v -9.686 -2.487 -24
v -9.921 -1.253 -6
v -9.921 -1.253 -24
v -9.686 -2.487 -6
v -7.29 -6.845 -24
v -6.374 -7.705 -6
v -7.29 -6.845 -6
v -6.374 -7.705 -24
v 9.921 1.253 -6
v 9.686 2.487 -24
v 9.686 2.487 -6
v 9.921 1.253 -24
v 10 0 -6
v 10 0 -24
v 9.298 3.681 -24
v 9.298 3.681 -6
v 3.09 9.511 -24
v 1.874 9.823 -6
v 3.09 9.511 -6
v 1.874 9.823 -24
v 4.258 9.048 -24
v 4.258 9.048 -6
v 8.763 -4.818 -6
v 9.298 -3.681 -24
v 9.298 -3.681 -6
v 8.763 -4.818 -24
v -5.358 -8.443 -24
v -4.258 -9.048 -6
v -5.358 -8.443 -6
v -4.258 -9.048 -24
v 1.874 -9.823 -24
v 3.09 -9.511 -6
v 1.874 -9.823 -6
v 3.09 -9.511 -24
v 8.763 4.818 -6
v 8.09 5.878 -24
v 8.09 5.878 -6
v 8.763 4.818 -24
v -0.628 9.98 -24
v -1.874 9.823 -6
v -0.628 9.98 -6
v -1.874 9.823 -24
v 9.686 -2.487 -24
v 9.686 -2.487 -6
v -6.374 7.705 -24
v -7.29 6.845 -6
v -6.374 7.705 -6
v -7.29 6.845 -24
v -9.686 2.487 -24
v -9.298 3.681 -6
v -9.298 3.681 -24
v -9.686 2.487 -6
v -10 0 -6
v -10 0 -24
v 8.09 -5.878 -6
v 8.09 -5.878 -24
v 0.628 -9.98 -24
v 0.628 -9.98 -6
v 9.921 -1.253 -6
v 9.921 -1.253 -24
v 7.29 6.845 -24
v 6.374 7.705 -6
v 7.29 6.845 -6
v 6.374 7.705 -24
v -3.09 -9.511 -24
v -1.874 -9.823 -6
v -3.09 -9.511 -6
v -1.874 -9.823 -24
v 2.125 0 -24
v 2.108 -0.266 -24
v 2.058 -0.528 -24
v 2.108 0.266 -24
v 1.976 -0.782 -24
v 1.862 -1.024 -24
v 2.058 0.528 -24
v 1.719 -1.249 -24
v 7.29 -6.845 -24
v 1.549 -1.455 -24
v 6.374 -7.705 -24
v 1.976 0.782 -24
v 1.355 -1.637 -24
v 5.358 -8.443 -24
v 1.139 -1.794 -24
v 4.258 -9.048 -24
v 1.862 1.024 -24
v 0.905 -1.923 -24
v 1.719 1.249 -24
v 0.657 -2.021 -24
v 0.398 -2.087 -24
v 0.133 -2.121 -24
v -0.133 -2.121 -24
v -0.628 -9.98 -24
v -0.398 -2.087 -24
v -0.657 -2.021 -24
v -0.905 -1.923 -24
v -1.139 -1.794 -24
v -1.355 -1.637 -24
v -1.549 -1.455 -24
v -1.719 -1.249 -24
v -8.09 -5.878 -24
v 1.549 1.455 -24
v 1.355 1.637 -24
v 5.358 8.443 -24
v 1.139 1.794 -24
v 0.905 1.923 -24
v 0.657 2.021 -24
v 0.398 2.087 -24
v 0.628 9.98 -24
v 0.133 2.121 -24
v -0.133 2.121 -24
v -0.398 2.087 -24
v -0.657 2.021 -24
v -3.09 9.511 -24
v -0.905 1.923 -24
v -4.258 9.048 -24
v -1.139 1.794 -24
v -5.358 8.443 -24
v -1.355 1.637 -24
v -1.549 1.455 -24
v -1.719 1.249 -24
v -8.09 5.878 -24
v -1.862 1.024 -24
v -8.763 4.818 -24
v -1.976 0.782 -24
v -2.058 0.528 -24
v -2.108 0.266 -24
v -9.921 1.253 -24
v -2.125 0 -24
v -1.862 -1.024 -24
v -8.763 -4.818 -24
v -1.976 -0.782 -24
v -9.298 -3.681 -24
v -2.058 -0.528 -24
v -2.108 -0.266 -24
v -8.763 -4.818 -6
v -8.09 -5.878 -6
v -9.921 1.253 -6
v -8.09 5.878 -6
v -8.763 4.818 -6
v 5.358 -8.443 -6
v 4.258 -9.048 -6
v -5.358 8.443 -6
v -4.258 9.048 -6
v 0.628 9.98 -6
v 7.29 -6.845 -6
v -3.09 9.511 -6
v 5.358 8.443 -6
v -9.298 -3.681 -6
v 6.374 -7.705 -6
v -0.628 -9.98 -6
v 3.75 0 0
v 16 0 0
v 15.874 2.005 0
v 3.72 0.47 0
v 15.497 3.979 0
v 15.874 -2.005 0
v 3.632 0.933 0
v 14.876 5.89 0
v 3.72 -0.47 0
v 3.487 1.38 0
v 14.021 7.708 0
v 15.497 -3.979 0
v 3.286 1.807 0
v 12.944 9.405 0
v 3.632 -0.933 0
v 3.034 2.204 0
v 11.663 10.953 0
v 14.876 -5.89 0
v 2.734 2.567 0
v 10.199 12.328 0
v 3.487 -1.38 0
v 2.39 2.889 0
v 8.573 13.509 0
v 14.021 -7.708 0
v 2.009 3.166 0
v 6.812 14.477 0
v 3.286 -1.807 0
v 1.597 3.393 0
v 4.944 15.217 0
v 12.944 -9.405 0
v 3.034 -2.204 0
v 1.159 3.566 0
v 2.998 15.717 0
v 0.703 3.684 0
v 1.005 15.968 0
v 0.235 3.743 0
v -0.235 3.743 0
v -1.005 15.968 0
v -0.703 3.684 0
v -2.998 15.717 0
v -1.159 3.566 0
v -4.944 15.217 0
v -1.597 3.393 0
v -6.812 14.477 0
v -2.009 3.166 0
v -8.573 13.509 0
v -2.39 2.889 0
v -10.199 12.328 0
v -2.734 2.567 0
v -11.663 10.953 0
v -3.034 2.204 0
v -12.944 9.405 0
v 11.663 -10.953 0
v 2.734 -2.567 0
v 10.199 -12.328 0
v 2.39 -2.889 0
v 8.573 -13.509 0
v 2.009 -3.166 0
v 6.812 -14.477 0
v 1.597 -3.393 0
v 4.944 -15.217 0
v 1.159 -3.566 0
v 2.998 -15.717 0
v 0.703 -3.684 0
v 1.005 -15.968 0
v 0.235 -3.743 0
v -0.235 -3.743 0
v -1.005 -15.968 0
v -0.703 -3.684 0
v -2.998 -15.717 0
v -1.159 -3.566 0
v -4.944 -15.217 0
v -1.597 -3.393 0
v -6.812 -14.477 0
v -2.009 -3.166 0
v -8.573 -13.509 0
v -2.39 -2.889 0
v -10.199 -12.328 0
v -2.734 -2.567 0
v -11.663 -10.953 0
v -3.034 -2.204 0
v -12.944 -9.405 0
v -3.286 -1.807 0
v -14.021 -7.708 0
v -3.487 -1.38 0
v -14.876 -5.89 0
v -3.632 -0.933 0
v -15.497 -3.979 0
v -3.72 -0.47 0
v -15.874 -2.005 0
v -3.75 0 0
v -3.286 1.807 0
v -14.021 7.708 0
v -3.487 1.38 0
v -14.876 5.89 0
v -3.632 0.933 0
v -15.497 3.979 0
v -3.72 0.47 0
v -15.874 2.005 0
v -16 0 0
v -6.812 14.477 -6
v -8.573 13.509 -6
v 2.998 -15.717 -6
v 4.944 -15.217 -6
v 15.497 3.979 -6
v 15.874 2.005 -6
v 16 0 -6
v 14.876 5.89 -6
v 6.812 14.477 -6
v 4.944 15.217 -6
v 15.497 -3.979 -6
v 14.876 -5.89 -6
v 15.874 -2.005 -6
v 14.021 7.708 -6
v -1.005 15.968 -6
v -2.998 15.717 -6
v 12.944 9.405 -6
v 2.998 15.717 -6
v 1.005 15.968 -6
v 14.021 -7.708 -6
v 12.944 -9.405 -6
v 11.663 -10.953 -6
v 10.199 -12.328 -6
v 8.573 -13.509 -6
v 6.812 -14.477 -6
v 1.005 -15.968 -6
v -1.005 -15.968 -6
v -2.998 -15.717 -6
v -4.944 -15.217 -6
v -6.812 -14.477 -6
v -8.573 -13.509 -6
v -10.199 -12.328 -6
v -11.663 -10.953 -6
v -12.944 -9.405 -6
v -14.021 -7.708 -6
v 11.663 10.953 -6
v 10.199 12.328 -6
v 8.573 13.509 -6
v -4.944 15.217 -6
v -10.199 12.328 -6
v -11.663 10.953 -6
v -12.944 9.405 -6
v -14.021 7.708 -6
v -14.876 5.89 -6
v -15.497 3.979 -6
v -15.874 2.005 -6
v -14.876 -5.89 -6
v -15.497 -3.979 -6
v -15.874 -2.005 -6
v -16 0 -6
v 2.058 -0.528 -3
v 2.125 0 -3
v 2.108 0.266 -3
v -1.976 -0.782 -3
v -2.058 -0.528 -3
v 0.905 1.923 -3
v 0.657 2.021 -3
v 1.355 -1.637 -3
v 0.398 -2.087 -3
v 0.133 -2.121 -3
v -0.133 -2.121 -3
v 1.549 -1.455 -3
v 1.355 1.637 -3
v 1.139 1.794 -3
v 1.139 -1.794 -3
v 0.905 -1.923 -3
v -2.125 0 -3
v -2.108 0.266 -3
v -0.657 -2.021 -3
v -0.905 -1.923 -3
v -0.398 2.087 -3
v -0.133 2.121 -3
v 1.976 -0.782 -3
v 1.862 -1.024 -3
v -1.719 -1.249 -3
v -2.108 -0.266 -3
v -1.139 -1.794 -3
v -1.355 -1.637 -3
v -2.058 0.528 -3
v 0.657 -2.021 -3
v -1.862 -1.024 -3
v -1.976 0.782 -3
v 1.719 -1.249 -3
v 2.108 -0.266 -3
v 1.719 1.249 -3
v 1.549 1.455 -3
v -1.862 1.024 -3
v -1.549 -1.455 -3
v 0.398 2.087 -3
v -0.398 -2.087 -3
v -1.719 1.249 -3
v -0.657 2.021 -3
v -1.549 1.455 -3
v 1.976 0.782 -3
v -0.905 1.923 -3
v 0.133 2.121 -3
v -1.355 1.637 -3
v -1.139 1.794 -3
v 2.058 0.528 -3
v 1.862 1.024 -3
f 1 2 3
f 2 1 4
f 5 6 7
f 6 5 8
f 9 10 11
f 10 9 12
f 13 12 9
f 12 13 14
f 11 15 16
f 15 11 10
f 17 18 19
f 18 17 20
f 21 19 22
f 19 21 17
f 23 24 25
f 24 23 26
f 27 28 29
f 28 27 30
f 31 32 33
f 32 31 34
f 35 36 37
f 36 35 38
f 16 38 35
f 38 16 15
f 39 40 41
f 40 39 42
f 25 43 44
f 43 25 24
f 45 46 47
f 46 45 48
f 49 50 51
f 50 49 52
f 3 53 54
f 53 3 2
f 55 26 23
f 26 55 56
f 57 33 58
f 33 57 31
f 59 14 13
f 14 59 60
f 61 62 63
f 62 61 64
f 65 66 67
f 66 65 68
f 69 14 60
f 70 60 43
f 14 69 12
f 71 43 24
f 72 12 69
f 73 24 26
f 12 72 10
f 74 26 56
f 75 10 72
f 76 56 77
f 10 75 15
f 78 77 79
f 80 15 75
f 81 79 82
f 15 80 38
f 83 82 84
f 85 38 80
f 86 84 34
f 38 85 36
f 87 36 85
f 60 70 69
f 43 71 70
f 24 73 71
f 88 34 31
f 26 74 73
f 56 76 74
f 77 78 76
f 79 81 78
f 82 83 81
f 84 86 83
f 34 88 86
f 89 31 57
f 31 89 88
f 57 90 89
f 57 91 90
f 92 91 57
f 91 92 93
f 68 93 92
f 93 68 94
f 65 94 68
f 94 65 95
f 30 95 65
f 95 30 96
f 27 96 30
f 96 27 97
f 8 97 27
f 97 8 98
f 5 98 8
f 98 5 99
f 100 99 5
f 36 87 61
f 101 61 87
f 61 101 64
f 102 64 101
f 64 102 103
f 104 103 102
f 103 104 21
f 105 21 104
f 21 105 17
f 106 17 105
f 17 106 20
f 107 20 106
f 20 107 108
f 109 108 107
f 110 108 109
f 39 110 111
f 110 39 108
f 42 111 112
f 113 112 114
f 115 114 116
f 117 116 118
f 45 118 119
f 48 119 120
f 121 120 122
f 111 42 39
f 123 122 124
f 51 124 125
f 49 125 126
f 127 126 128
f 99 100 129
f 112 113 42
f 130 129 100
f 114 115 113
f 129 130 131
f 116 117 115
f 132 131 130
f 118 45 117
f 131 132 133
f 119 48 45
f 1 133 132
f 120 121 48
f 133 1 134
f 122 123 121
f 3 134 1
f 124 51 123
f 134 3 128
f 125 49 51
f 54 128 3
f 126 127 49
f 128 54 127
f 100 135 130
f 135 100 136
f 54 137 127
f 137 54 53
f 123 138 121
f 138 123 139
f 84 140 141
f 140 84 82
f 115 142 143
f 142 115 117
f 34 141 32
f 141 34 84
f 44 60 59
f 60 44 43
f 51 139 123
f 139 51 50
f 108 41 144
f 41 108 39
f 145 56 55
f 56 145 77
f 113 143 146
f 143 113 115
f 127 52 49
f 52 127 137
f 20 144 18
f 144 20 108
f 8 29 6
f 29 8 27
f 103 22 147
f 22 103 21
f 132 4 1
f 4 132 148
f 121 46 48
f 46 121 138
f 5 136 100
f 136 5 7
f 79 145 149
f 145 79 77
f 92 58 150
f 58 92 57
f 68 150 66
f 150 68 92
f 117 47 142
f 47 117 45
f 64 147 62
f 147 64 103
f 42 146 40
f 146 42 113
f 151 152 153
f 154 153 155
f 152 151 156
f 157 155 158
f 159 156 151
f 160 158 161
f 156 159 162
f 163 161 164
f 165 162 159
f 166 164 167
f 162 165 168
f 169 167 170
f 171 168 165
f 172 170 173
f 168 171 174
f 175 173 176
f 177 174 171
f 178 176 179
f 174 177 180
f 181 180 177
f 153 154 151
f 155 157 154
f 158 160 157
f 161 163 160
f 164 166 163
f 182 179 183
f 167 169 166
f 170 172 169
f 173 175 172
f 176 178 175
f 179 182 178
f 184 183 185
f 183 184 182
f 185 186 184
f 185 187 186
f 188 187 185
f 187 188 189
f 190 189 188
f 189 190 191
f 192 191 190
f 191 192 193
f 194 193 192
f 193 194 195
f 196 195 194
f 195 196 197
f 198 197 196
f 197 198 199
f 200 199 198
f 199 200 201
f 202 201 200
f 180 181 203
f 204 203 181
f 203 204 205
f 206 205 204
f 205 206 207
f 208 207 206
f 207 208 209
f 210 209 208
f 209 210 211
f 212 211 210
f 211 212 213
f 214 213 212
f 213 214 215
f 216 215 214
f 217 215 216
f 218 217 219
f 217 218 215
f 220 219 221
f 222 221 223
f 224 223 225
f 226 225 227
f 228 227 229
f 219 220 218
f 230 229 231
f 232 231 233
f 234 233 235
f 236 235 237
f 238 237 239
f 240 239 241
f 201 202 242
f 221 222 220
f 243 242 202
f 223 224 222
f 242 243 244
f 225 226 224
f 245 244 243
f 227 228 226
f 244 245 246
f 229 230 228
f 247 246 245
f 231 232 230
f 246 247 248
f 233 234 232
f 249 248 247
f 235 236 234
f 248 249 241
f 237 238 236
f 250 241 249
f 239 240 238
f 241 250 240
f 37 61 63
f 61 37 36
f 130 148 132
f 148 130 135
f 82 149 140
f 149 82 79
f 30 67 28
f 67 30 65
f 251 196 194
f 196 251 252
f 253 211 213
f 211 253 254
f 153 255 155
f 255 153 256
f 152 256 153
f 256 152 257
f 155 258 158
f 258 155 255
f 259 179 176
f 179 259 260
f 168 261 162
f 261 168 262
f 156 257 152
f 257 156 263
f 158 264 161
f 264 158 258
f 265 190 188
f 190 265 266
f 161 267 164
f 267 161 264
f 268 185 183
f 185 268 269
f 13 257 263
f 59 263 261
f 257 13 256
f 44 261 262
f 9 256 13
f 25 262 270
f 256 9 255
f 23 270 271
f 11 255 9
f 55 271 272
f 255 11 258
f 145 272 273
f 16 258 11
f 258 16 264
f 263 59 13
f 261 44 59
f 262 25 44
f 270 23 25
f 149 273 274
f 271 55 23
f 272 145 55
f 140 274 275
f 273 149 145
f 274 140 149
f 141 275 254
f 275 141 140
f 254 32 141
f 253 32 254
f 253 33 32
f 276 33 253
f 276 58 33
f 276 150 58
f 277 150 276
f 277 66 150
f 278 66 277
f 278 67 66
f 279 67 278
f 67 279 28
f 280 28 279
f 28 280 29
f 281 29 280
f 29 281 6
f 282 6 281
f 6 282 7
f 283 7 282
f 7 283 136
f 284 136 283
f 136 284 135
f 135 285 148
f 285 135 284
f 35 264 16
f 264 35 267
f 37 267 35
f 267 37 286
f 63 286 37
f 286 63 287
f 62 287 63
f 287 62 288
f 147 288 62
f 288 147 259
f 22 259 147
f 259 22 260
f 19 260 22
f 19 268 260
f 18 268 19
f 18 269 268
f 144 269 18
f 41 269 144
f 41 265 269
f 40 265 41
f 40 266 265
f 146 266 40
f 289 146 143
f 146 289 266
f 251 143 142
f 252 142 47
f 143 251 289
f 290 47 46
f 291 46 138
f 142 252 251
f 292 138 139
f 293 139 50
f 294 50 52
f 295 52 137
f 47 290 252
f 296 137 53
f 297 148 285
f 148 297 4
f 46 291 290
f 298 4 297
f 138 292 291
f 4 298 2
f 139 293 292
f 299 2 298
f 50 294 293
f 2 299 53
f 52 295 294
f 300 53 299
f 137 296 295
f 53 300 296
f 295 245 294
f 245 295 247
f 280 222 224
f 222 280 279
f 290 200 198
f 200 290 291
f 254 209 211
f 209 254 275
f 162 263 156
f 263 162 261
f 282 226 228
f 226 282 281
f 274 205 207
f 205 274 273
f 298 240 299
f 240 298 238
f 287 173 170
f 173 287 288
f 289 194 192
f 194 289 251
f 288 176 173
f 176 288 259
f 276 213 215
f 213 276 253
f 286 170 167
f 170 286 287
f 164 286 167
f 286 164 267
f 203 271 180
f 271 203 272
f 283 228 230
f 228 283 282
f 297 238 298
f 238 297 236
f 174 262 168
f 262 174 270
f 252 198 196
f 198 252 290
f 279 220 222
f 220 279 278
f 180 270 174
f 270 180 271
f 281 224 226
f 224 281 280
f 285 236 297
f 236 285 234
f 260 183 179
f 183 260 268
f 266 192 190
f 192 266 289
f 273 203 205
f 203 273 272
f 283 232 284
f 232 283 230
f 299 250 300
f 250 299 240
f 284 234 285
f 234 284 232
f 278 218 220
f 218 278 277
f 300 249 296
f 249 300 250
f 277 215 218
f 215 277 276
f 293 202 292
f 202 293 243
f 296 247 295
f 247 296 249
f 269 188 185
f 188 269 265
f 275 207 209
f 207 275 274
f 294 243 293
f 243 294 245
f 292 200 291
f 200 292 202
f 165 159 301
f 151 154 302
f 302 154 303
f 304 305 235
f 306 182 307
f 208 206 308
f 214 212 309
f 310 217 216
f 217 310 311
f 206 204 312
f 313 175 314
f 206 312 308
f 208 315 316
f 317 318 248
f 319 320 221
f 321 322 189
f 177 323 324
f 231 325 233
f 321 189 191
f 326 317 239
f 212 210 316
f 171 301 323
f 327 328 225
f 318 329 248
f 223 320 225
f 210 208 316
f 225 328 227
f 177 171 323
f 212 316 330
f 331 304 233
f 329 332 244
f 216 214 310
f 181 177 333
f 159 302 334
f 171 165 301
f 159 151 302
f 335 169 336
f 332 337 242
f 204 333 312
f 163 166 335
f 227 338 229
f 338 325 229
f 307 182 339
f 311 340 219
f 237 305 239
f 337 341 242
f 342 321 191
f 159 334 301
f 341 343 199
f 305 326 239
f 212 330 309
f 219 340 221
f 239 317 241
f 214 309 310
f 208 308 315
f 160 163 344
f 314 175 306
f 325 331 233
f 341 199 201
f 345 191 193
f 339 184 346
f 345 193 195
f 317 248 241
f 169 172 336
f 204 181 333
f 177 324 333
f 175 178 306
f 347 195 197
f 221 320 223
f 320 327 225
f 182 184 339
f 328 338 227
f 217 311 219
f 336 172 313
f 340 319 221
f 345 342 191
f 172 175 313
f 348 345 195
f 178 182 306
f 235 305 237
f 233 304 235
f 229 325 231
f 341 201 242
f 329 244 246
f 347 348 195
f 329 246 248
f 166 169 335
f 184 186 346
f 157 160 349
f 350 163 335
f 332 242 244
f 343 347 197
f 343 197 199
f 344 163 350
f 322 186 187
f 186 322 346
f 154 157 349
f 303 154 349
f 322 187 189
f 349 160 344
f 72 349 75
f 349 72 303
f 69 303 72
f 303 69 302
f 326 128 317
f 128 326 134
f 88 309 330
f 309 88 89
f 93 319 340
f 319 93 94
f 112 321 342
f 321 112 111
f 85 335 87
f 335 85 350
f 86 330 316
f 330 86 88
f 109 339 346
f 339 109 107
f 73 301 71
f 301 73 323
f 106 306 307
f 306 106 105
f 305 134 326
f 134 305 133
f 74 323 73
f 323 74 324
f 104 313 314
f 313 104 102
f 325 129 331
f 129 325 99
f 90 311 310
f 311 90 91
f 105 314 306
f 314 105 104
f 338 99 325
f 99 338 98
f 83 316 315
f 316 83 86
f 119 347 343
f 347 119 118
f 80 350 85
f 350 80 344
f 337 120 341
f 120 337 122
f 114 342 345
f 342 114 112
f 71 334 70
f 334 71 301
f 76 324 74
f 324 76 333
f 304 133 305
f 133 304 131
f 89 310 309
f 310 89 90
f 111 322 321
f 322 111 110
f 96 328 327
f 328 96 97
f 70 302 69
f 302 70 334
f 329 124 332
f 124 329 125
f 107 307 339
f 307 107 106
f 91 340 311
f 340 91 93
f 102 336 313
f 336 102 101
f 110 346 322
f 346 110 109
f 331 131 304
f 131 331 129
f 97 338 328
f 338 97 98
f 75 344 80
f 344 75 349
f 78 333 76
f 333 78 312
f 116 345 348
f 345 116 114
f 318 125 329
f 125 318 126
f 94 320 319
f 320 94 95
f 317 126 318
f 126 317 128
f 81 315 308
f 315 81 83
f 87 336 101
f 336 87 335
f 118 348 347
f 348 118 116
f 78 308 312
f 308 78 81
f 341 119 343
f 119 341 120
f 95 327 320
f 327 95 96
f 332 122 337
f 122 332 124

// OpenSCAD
$fn = 50;


difference() {
	union() {
		translate(v = [0, 0, -24.0000000000]) {
			cylinder(h = 24, r = 10.0000000000);
		}
		translate(v = [0, 0, -6.0000000000]) {
			cylinder(h = 6, r = 16.0000000000);
		}
	}
	union() {
		translate(v = [0, 0, 0]) {
			rotate(a = [0, 0, 0]) {
				difference() {
					union() {
						#translate(v = [0, 0, -24.0000000000]) {
							cylinder(h = 24, r = 2.0000000000);
						}
						#translate(v = [0, 0, -3]) {
							cylinder(h = 3, r = 10.0000000000, r1 = 2.1250000000, r2 = 3.7500000000);
						}
						#translate(v = [0, 0, -24.0000000000]) {
							cylinder(h = 24, r = 2.1250000000);
						}
						#translate(v = [0, 0, -24.0000000000]) {
							cylinder(h = 24, r = 2.0000000000);
						}
					}
					union();
				}
			}
		}
	}
}
